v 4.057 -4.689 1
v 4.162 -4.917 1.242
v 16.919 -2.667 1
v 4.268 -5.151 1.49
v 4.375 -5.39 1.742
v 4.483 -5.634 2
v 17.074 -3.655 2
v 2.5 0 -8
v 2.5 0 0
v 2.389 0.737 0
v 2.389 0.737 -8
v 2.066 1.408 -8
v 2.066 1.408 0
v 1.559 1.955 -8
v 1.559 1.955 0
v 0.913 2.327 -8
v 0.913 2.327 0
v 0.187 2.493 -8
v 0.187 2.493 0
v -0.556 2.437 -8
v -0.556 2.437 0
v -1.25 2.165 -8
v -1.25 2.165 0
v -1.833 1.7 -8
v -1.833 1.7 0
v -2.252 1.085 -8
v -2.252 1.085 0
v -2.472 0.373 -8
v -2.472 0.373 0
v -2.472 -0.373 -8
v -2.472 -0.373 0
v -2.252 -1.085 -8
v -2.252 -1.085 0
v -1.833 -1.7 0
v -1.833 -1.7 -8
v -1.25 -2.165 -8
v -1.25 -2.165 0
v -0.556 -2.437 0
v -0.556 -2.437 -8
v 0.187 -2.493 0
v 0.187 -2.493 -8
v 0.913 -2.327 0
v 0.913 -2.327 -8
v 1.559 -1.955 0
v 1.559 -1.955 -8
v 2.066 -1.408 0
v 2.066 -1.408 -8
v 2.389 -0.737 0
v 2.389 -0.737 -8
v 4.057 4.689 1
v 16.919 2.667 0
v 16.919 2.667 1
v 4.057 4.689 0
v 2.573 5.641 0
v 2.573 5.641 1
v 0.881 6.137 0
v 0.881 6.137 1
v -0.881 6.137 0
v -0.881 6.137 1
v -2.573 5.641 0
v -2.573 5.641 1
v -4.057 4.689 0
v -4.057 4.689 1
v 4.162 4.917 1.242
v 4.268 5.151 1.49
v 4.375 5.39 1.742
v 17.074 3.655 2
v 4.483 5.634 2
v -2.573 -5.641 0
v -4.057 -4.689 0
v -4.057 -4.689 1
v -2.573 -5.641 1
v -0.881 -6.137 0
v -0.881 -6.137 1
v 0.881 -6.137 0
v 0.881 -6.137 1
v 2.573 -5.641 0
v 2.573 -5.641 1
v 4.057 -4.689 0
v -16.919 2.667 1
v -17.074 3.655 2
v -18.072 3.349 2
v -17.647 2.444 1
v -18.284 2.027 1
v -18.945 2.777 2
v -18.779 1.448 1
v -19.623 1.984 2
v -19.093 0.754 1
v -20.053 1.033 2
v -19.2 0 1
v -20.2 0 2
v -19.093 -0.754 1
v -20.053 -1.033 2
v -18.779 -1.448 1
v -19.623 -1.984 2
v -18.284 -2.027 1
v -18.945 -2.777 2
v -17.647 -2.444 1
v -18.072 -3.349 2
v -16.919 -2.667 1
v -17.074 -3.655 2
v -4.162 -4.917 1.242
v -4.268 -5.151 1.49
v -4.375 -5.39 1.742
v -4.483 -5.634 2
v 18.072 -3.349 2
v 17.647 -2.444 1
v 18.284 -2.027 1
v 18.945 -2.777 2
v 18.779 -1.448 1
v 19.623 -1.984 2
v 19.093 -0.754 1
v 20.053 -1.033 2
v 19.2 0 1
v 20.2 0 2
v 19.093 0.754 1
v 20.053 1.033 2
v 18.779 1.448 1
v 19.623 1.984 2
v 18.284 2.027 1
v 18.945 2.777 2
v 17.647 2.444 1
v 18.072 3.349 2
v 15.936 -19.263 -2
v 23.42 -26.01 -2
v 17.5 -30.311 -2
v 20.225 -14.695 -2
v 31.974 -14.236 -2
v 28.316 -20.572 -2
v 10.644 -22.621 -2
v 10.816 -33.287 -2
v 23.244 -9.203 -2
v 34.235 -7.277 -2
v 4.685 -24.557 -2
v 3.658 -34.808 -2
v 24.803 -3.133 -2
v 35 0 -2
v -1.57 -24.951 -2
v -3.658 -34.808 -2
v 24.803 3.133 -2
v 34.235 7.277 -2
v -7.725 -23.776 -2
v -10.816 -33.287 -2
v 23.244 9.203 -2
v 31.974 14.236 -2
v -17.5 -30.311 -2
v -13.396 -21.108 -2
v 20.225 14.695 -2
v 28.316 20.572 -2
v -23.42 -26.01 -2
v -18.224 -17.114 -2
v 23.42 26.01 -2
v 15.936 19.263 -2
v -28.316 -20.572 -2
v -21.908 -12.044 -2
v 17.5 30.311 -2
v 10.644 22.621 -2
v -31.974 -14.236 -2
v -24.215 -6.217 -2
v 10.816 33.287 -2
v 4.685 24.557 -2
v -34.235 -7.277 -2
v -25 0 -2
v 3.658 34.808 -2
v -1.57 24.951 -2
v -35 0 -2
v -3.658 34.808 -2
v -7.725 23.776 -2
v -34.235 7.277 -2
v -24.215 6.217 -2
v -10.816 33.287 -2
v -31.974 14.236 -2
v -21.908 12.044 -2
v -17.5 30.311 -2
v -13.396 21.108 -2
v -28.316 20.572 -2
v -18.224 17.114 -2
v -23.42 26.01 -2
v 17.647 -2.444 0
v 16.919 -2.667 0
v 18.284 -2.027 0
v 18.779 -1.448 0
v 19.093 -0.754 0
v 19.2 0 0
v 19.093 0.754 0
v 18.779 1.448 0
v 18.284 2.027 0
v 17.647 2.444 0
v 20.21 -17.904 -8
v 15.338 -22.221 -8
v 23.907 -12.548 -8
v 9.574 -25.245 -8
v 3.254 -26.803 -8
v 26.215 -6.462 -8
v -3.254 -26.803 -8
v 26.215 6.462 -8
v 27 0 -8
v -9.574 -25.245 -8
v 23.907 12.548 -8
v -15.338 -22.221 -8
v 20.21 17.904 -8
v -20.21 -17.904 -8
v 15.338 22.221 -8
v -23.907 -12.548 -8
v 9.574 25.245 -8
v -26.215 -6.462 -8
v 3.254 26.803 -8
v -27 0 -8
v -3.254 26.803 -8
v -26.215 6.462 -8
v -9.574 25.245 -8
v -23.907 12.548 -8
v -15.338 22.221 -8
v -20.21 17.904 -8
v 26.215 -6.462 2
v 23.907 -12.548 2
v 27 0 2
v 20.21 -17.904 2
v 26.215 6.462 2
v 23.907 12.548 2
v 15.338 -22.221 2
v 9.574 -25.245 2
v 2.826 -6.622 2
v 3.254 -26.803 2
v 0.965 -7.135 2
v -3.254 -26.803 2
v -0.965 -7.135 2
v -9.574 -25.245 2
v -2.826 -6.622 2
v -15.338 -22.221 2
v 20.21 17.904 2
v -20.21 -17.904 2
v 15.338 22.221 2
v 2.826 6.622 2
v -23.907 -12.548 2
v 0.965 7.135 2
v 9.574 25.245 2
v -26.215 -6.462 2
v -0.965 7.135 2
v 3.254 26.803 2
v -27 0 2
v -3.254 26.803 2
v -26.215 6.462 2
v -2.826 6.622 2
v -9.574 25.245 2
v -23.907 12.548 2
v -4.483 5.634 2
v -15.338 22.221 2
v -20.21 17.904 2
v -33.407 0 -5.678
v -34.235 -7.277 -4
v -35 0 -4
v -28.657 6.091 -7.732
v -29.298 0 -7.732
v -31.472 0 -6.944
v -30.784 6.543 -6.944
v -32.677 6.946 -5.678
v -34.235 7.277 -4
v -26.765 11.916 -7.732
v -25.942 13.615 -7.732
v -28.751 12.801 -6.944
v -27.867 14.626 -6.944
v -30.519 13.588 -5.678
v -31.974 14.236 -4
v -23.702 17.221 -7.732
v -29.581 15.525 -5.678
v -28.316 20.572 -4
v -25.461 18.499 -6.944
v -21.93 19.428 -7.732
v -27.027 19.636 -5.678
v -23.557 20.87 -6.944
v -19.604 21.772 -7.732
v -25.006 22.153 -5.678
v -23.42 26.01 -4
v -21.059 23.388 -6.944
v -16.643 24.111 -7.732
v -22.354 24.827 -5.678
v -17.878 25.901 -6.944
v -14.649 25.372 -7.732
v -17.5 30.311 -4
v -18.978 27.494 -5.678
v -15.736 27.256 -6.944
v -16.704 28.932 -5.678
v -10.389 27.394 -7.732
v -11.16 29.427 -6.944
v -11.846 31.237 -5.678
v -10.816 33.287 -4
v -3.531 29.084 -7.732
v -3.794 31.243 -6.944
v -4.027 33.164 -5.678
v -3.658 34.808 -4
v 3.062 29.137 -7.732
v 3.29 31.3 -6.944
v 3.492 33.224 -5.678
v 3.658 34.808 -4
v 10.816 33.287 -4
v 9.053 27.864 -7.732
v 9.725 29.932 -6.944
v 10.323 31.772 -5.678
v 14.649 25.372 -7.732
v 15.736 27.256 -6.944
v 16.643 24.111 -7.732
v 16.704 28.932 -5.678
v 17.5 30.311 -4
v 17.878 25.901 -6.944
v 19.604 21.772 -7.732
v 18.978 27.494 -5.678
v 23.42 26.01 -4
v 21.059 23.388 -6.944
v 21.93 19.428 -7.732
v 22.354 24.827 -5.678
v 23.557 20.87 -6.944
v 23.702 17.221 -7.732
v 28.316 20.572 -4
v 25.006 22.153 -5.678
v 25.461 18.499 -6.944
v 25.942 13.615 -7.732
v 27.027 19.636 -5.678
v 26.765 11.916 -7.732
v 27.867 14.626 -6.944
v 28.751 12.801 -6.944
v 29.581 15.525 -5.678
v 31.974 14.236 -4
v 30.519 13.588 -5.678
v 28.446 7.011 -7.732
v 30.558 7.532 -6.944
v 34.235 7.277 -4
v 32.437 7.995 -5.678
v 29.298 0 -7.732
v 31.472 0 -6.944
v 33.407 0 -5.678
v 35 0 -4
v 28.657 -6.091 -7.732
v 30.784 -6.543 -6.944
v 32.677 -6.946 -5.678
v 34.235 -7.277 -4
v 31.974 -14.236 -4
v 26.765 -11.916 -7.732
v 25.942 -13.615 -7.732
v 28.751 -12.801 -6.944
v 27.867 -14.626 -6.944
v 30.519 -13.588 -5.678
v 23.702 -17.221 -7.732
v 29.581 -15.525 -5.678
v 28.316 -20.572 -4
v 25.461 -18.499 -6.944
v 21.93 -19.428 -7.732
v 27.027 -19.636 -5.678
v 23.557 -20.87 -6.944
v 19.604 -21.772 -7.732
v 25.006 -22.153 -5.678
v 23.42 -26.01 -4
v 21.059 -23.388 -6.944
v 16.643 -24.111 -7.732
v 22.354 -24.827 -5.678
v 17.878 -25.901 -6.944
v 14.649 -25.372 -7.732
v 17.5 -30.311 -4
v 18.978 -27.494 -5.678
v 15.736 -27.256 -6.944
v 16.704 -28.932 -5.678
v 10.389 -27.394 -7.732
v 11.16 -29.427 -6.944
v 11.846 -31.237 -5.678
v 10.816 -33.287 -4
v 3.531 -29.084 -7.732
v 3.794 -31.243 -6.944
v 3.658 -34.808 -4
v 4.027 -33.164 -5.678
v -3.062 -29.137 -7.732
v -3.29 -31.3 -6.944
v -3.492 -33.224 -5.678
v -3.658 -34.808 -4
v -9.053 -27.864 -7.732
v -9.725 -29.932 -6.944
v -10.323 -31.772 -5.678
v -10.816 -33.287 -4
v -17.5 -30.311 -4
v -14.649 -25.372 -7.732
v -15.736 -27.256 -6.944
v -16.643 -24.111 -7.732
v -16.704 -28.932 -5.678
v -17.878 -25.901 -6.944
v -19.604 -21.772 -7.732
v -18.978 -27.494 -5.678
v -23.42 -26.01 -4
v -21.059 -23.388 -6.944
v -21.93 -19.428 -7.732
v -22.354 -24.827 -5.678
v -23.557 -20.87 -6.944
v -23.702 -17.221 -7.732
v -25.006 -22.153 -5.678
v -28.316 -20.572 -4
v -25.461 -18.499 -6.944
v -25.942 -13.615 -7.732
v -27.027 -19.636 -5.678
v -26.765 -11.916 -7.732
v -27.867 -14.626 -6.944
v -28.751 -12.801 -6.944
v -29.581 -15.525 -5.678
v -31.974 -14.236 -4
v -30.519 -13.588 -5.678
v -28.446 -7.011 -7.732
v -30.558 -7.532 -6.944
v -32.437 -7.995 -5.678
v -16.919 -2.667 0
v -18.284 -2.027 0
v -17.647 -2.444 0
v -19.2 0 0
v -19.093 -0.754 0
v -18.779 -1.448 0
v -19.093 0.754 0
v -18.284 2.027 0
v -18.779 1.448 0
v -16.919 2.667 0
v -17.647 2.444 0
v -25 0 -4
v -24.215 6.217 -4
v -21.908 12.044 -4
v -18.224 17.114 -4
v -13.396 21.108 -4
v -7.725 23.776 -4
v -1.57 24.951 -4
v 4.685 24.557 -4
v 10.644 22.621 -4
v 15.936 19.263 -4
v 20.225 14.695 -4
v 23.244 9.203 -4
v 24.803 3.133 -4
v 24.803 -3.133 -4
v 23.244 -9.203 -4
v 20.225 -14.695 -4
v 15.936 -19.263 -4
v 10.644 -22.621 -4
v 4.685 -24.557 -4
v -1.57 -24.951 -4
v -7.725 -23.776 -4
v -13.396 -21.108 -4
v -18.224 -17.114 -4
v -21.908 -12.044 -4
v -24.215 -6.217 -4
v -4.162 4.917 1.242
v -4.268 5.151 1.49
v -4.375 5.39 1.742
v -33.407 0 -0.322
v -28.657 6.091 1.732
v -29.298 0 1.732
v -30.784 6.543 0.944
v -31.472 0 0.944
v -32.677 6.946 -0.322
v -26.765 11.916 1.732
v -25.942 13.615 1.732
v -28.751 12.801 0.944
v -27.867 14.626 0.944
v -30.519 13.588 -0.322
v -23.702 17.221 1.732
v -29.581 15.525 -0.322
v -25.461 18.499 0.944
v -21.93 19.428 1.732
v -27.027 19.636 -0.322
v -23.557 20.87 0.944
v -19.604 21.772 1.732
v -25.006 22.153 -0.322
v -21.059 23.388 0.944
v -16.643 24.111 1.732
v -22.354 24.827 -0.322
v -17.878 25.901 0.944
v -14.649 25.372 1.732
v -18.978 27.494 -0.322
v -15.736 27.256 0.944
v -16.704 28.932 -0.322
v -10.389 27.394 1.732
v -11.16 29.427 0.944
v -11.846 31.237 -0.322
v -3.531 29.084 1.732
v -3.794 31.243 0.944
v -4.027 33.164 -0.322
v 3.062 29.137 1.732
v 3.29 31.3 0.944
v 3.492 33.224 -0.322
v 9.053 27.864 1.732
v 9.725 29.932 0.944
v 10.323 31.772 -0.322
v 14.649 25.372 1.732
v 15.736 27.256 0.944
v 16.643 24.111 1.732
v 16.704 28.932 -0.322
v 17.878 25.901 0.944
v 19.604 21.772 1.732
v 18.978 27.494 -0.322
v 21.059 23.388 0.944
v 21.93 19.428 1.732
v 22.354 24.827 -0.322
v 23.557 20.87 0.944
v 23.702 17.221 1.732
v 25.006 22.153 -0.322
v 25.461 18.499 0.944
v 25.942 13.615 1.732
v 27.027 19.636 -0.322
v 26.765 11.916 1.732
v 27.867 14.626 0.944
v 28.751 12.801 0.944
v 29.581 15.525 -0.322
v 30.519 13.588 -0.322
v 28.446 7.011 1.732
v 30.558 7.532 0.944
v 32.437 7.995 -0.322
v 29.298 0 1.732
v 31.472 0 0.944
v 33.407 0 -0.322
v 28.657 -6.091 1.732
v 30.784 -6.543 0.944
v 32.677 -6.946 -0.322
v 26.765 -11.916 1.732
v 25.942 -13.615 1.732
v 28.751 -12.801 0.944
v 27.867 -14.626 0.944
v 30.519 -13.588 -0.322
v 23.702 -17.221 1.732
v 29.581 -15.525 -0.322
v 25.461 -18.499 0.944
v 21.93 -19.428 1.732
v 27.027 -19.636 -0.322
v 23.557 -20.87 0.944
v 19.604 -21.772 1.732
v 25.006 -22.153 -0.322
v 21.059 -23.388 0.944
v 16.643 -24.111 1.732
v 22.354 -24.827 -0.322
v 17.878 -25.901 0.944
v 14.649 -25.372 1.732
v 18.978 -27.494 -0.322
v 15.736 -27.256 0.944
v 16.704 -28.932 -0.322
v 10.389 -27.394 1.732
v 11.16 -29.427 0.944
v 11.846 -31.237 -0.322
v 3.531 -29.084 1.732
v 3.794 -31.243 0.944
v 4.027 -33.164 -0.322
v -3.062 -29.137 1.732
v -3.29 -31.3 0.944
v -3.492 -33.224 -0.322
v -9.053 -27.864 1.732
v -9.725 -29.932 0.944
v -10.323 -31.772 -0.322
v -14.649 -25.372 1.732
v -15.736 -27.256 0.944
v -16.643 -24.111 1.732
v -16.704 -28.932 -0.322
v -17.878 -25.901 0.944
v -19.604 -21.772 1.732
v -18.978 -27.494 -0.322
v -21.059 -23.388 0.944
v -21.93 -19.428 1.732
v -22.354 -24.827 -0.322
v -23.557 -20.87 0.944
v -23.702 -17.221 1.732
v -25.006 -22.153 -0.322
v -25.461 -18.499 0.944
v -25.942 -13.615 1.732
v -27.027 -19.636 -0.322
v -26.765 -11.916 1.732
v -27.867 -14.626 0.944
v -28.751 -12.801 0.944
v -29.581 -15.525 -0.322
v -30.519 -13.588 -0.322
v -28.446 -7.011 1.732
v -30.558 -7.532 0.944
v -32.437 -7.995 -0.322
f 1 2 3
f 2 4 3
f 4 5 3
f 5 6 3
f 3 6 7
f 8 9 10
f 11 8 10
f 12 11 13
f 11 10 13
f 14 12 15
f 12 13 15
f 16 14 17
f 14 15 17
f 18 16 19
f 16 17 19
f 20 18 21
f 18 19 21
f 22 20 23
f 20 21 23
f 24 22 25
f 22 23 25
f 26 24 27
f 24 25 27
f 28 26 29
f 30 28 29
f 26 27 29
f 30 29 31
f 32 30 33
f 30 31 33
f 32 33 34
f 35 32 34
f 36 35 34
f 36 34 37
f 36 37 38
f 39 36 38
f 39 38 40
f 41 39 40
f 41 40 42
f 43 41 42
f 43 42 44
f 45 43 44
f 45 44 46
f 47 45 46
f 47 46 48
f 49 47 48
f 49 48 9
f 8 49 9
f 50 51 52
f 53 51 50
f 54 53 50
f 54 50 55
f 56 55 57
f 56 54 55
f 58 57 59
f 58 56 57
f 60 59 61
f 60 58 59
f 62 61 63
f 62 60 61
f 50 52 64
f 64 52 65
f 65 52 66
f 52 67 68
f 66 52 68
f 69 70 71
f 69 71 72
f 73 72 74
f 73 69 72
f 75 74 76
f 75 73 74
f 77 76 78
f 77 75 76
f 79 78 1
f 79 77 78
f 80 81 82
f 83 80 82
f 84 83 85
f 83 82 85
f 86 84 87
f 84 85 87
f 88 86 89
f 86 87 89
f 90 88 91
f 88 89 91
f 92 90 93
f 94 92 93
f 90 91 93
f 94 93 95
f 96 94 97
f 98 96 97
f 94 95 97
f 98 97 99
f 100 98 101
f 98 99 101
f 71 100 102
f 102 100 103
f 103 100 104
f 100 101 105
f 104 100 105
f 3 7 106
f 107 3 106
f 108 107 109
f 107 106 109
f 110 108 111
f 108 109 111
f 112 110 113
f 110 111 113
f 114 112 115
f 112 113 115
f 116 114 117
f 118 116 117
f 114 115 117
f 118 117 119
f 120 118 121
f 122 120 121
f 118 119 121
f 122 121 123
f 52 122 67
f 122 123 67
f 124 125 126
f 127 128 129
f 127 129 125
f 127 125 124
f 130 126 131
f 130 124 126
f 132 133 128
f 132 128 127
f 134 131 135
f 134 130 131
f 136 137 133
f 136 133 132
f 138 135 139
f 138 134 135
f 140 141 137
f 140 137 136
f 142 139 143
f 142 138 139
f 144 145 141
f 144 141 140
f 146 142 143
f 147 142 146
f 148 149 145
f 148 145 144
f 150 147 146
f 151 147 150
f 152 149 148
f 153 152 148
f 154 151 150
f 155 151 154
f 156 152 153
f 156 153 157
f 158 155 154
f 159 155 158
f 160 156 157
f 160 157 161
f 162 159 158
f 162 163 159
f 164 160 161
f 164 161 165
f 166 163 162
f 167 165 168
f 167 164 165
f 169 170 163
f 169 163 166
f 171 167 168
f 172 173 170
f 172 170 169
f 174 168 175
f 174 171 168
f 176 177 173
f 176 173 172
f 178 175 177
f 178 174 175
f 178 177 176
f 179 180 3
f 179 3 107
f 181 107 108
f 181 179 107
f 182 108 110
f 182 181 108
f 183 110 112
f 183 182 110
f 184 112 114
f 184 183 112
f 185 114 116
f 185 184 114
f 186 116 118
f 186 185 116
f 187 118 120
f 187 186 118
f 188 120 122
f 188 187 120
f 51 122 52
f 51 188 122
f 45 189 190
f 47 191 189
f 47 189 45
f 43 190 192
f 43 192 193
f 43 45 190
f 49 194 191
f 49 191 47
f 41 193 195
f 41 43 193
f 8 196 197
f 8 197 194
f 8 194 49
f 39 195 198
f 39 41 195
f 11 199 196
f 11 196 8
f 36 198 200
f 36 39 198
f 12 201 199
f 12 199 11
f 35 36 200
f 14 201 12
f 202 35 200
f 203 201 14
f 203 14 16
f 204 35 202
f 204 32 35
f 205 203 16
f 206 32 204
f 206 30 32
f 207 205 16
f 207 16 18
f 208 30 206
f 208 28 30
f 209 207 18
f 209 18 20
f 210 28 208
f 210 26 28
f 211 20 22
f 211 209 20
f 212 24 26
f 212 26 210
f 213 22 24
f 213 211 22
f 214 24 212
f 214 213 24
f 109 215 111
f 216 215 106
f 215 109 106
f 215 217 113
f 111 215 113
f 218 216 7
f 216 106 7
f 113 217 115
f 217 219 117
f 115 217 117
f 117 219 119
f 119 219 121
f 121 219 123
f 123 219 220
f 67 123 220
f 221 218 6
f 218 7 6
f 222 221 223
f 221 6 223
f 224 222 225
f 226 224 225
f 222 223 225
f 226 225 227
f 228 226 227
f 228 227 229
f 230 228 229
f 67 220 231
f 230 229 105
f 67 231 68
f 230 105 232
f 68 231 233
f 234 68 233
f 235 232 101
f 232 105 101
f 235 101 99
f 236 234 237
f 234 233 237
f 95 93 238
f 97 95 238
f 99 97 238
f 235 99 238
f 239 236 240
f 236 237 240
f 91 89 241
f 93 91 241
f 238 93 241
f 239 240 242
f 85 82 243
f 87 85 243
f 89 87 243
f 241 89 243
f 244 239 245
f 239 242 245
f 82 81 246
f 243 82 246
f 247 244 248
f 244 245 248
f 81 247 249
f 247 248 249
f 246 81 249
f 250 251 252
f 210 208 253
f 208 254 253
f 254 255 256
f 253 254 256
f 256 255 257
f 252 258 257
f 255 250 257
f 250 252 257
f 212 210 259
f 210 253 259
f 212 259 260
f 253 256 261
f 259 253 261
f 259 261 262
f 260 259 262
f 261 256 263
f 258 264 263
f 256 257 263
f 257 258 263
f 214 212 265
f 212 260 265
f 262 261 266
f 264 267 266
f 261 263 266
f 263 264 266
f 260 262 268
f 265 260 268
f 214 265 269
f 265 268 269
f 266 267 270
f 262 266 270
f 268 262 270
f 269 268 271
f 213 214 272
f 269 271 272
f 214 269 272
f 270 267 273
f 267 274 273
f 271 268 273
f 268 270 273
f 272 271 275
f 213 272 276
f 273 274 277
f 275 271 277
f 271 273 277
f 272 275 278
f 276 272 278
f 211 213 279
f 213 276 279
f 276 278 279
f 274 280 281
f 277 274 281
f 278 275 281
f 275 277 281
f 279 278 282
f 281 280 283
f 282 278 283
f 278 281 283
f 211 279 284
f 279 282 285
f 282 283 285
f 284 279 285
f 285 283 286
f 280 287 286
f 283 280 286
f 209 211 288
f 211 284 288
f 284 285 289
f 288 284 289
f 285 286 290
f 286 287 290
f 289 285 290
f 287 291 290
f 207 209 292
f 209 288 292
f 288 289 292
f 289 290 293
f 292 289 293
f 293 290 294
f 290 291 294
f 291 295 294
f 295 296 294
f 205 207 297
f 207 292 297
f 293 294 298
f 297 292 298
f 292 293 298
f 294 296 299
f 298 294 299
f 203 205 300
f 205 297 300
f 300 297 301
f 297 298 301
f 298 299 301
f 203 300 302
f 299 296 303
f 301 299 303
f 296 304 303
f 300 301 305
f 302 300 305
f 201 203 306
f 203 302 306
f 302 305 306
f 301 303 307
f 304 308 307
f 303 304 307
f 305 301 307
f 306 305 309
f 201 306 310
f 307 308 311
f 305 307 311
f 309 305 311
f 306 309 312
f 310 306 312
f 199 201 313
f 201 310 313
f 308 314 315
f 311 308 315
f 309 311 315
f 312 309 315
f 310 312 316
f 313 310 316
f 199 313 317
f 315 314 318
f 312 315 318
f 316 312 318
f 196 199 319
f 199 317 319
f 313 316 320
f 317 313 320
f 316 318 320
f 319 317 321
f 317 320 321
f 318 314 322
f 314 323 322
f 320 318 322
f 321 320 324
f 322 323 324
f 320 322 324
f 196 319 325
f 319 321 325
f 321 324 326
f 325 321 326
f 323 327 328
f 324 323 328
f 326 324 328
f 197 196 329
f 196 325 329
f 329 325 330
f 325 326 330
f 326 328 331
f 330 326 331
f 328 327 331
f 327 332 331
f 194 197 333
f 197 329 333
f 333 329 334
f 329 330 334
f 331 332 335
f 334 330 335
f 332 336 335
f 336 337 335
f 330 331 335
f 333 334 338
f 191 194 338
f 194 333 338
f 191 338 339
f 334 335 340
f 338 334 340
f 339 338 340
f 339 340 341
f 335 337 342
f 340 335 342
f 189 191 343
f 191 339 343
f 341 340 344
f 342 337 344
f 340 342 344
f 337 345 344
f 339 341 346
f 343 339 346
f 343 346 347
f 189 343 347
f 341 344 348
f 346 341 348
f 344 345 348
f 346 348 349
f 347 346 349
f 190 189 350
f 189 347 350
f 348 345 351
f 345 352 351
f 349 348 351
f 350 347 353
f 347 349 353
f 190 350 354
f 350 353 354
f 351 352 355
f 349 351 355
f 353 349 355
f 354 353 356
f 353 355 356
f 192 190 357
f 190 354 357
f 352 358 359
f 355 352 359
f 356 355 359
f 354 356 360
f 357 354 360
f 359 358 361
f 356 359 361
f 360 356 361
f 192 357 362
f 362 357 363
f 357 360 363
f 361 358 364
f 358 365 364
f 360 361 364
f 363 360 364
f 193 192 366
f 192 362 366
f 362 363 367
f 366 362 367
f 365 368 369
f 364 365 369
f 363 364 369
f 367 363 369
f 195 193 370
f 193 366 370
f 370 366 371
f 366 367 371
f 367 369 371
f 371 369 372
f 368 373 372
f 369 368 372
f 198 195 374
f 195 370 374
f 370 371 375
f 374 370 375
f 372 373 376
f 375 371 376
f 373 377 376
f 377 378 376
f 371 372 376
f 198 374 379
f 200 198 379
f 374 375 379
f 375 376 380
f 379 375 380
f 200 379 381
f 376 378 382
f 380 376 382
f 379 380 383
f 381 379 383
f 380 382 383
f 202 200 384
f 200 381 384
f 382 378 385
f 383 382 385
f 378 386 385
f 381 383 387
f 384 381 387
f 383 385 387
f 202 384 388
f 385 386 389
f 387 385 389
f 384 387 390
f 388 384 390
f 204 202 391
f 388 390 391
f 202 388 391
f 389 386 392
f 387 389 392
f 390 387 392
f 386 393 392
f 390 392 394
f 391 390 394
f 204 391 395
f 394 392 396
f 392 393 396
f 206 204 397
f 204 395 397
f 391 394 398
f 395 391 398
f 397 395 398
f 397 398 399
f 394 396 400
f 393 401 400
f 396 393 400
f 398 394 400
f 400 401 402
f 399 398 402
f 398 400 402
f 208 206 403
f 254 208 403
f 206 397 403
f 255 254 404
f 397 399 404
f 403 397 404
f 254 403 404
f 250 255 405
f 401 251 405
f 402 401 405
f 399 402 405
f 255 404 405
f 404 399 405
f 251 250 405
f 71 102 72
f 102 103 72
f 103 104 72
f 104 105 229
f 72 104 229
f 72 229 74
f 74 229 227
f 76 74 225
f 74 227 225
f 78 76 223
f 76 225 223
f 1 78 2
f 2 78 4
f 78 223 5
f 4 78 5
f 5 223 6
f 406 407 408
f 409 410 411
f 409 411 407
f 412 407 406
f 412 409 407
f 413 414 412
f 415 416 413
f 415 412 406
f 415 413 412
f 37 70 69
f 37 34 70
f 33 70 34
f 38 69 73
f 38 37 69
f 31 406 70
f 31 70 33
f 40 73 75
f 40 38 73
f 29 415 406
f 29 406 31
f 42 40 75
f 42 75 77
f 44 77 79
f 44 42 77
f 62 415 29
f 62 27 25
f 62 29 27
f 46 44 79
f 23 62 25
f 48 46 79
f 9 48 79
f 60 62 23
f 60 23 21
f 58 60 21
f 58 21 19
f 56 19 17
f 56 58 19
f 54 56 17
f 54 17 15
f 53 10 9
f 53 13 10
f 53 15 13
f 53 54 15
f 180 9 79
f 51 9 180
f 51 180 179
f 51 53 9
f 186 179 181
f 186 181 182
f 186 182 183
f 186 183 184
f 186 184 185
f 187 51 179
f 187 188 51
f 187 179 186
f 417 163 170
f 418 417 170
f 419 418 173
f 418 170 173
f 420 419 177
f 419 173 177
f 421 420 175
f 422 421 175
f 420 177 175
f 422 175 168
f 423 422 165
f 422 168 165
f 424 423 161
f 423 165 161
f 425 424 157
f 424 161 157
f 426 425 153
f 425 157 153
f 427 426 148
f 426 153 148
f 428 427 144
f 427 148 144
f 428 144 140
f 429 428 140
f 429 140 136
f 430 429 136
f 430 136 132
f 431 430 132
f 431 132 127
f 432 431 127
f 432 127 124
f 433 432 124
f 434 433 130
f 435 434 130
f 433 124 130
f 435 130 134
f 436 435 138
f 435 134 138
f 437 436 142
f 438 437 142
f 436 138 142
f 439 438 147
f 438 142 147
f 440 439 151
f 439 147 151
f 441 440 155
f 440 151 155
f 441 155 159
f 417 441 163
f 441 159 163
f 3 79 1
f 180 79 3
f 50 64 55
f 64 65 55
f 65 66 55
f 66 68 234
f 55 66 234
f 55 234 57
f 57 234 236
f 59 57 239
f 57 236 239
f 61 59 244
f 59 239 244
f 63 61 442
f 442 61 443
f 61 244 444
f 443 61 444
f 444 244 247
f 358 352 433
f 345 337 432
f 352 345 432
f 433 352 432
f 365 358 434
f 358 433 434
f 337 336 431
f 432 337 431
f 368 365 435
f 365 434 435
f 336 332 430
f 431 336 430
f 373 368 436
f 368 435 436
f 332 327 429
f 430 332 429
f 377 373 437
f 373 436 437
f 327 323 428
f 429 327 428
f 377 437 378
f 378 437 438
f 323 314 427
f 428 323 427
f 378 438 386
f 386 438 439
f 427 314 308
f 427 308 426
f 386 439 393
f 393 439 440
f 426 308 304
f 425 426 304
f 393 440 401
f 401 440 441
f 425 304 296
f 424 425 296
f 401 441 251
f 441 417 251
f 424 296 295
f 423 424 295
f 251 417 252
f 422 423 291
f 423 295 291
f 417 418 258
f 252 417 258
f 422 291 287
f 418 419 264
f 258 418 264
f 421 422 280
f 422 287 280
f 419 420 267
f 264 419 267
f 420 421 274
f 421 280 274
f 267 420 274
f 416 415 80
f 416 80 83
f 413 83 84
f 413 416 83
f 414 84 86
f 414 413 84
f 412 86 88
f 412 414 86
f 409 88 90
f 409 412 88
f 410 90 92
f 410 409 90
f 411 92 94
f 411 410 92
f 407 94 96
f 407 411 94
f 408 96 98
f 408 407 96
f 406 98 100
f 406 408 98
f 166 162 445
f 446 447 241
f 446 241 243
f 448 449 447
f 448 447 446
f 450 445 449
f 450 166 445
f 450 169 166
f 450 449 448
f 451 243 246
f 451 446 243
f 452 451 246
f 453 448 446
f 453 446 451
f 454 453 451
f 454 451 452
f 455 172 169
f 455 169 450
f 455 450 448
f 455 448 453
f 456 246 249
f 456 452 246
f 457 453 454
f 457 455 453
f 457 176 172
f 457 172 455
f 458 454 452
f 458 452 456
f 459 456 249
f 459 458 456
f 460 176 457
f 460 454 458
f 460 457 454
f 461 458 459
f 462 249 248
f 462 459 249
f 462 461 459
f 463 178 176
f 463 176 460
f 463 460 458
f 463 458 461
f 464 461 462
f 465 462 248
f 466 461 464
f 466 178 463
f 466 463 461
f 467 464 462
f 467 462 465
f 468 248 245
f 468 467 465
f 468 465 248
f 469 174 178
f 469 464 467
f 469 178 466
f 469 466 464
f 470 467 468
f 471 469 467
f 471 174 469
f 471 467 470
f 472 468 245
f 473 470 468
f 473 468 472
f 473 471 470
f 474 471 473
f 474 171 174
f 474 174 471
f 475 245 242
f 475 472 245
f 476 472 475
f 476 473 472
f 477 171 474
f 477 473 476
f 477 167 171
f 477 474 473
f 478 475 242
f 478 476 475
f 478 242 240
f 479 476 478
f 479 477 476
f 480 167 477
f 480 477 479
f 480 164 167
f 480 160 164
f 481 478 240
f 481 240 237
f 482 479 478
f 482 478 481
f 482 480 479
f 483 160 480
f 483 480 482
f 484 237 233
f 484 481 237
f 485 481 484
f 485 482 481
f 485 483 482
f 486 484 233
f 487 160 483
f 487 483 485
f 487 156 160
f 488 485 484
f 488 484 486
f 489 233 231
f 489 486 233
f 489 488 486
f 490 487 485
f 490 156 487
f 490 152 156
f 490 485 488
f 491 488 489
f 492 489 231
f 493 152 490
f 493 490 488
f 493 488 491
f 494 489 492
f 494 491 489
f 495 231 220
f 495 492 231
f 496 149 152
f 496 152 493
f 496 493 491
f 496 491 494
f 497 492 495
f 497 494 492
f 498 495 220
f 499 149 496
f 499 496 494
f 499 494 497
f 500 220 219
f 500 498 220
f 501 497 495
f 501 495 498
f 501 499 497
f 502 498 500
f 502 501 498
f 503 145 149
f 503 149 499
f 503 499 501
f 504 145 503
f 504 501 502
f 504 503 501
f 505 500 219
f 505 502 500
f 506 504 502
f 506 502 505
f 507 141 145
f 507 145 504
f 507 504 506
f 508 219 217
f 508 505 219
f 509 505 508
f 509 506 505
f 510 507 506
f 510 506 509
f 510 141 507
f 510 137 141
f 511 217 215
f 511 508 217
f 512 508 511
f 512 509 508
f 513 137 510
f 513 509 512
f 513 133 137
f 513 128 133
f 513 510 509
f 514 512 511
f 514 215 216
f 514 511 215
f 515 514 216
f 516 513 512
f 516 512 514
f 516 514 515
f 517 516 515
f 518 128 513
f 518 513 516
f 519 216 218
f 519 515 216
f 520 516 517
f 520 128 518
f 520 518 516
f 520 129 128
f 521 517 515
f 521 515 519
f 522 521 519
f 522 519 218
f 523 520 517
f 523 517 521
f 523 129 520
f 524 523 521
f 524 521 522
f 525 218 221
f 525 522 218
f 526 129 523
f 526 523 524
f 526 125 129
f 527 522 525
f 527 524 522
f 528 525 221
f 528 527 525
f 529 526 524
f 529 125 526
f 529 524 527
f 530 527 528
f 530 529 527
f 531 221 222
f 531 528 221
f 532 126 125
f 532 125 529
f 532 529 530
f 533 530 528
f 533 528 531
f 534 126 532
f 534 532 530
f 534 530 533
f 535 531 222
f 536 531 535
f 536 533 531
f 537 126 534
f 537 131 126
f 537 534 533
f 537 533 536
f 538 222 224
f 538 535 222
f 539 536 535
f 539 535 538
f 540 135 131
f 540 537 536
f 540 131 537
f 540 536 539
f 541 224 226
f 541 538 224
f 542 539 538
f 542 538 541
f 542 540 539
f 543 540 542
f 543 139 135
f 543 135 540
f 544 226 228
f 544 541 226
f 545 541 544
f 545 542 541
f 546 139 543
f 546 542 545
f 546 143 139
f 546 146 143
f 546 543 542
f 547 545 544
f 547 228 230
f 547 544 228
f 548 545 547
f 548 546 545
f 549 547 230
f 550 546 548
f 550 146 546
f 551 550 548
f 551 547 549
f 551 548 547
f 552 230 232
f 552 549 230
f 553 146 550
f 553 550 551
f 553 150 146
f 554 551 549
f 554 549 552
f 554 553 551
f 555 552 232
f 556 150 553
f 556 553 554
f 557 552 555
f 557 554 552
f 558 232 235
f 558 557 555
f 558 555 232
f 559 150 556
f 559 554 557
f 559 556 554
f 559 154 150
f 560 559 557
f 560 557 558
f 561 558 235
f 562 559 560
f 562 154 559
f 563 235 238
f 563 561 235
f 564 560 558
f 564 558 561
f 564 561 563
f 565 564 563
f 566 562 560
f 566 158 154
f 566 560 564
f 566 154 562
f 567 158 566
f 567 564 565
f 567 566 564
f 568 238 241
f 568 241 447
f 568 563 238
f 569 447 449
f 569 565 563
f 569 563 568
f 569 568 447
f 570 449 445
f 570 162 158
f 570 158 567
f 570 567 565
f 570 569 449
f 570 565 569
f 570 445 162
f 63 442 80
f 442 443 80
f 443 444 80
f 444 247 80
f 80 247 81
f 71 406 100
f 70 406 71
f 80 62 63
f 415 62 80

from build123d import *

# Parameters (mm, degrees)
SKETCH_1_R               = 1.5
EXTRUDE_1_DEPTH          = 2.3
SKETCH_2_R               = 4.4
EXTRUDE_2_DEPTH          = 3.2
SKETCH_3_R               = 4.4
SKETCH_3_R_2             = 3.4
SKETCH_3_R_3             = 2.75
SKETCH_3_R_4             = 1.5
CUT_EXTRUDE_1_DEPTH      = 1
BOSS_EXTRUDE1_DEPTH      = 2
BOSS_EXTRUDE1_DEPTH_BACK = 2
SKETCH1_R                = 35
INTERSECT2_OUTLINE_R     = 4.4
INTERSECT2_OUTLINE_R_2   = 3.4
INTERSECT2_OUTLINE_R_3   = 2.75
INTERSECT2_DEPTH         = 5.5
INTERSECT2_START         = 1
INTERSECT2_2_OUTLINE_R   = 4.4
INTERSECT2_2_OUTLINE_R_2 = 3.4
INTERSECT2_2_OUTLINE_R_3 = 2.75
INTERSECT2_2_OUTLINE_R_4 = 1.5
INTERSECT2_2_DEPTH       = 4.5
FILLET1_R                = 10
SKETCH2_R                = 25
BOSS_EXTRUDE2_DEPTH      = 2
SKETCH3_R                = 27
BOSS_EXTRUDE3_DEPTH      = 2
SKETCH4_R                = 6
CUT_EXTRUDE1_DEPTH       = 2
CUT_EXTRUDE3_REACH       = 52.14
SKETCH5_R                = 2.5
CUT_EXTRUDE4_START       = -2
CUT_EXTRUDE4_DEPTH       = 2
CHAMFER1_SIZE            = 1


# Read off the part's stored shape, not the designer's step: Intersect2
with BuildPart() as part:
    # Эскиз1 → Бобышка-Вытянуть1 (new body)
    with BuildSketch(Plane.XY):
        with BuildLine():
            Line((-3.968626967, 4.5), (-16.888114198, 2.469689731))
            ThreePointArc((-16.888114198, 2.469689731), (-19, 0), (-16.888114198, -2.469689731))
            Line((-16.888114198, -2.469689731), (-3.968626967, -4.5))
            ThreePointArc((-3.968626967, -4.5), (0, -6), (3.968626967, -4.5))
            Line((3.968626967, -4.5), (16.888114198, -2.469689731))
            ThreePointArc((16.888114198, -2.469689731), (19, 0), (16.888114198, 2.469689731))
            Line((16.888114198, 2.469689731), (3.968626967, 4.5))
            ThreePointArc((3.968626967, 4.5), (0, 6), (-3.968626967, 4.5))
        make_face()
        Circle(SKETCH_1_R, mode=Mode.SUBTRACT)
    extrude(amount=EXTRUDE_1_DEPTH)

    # Эскиз2 → Бобышка-Вытянуть2 (add)
    with BuildSketch(Plane.XY.offset(2.3)):
        with Locations(Location((0, 0, 0), (0, 0, 180))):
            Circle(SKETCH_2_R)
        Polygon((0.333439775, 2.639447604), (0, 3.05), (-0.333439775, 2.639447604), (-0.758504156, 2.954178641), (-0.979368078, 2.473601404), (-1.469348706, 2.672735374), (-1.563759083, 2.15232973), (-2.087868673, 2.223354314), (-2.049893354, 1.695819264), (-2.575200173, 1.634271725), (-2.407225286, 1.132754236), (-2.900722375, 0.942501833), (-2.6133024, 0.498514094), (-3.043981522, 0.191511085), (-2.655176114, -0.167049522), (-2.995976115, -0.571513009), (-2.530215347, -0.822116802), (-2.75972251, -1.298626839), (-2.246271844, -1.42552746), (-2.35006539, -1.944143169), (-1.821186821, -1.939366985), (-1.792745019, -2.467501833), (-1.281669931, -2.33134895), (-1.122779886, -2.835818282), (-0.661621006, -2.576843686), (-0.382266362, -3.025949839), (0, -2.660425857), (0.382266362, -3.025949839), (0.661621006, -2.576843686), (1.122779886, -2.835818282), (1.281669931, -2.33134895), (1.792745019, -2.467501833), (1.821186821, -1.939366985), (2.35006539, -1.944143169), (2.246271844, -1.42552746), (2.75972251, -1.298626839), (2.530215347, -0.822116802), (2.995976115, -0.571513009), (2.655176114, -0.167049522), (3.043981522, 0.191511085), (2.6133024, 0.498514094), (2.900722375, 0.942501833), (2.407225286, 1.132754236), (2.575200173, 1.634271725), (2.049893354, 1.695819264), (2.087868673, 2.223354314), (1.563759083, 2.15232973), (1.469348706, 2.672735374), (0.979368078, 2.473601404), (0.758504156, 2.954178641), align=None, mode=Mode.SUBTRACT)
    extrude(amount=EXTRUDE_2_DEPTH)

    # Эскиз3 → Вырез-Вытянуть1 (cut)
    # profile 1 of 2: a face of its own
    with BuildSketch(Plane(origin=(0, 0, 0), x_dir=(-1, 0, 0), z_dir=(0, 0, -1))):
        Circle(SKETCH_3_R)
        Circle(SKETCH_3_R_2, mode=Mode.SUBTRACT)
    # profile 2 of 2: a face of its own
    with BuildSketch(Plane(origin=(0, 0, 0), x_dir=(-1, 0, 0), z_dir=(0, 0, -1))):
        Circle(SKETCH_3_R_3)
        Circle(SKETCH_3_R_4, mode=Mode.SUBTRACT)
    extrude(amount=-CUT_EXTRUDE_1_DEPTH, mode=Mode.SUBTRACT)


with BuildPart() as body_2:
    # Sketch1 → Boss-Extrude1 (new, two sides: drawn at the far end of the back side and taken through both)
    with BuildSketch(Plane(origin=(0, 0, 0), x_dir=(-1, 0, 0), z_dir=(0, 0, -1)).offset(-BOSS_EXTRUDE1_DEPTH_BACK)):
        Circle(SKETCH1_R)
    extrude(amount=BOSS_EXTRUDE1_DEPTH + BOSS_EXTRUDE1_DEPTH_BACK)


with BuildPart() as intersect2_tool:
    # Intersect2 outline → Intersect2 (new body)
    # profile 1 of 2: a face of its own
    with BuildSketch(Plane.XY):
        with BuildLine():
            ThreePointArc((3.968626967, 4.5), (0, 6), (-3.968626967, 4.5))
            Line((-3.968626967, 4.5), (-16.888114198, 2.469689731))
            ThreePointArc((-16.888114198, 2.469689731), (-19, 0), (-16.888114198, -2.469689731))
            Line((-16.888114198, -2.469689731), (-3.968626967, -4.5))
            ThreePointArc((-3.968626967, -4.5), (0, -6), (3.968626967, -4.5))
            Line((3.968626967, -4.5), (16.888114198, -2.469689731))
            ThreePointArc((16.888114198, -2.469689731), (19, 0), (16.888114198, 2.469689731))
            Line((16.888114198, 2.469689731), (3.968626967, 4.5))
        make_face()
        Circle(INTERSECT2_OUTLINE_R, mode=Mode.SUBTRACT)
    # profile 2 of 2: a face of its own
    with BuildSketch(Plane.XY):
        Circle(INTERSECT2_OUTLINE_R_2)
        Circle(INTERSECT2_OUTLINE_R_3, mode=Mode.SUBTRACT)
    extrude(amount=INTERSECT2_DEPTH)


with BuildPart() as part_1:
    add(part.part)

    # Intersect2: cut by intersect2_tool
    add(intersect2_tool.part, mode=Mode.SUBTRACT)


with BuildPart() as body_2_1:
    add(body_2.part)

    # Intersect2: cut by intersect2_tool
    add(intersect2_tool.part, mode=Mode.SUBTRACT)


with BuildPart() as intersect2_2_tool:
    # Intersect2 2 outline → Intersect2 2 (new body)
    # profile 1 of 2: a face of its own
    with BuildSketch(Plane.XY.offset(INTERSECT2_START)):
        Circle(INTERSECT2_2_OUTLINE_R)
        Circle(INTERSECT2_2_OUTLINE_R_2, mode=Mode.SUBTRACT)
    # profile 2 of 2: a face of its own
    with BuildSketch(Plane.XY.offset(INTERSECT2_START)):
        Circle(INTERSECT2_2_OUTLINE_R_3)
        Circle(INTERSECT2_2_OUTLINE_R_4, mode=Mode.SUBTRACT)
    extrude(amount=INTERSECT2_2_DEPTH)


with BuildPart() as part_2:
    add(part_1.part)

    # Intersect2 2: cut by intersect2_2_tool
    add(intersect2_2_tool.part, mode=Mode.SUBTRACT)


with BuildPart() as body_2_2:
    add(body_2_1.part)

    # Intersect2 2: cut by intersect2_2_tool
    add(intersect2_2_tool.part, mode=Mode.SUBTRACT)

    # Fillet1
    # the kernel refuses this fillet: 10 mm, written as the material it takes off along each edge
    with BuildSketch(Plane(origin=(0, 0, 2), x_dir=(-1, 0, 0), z_dir=(0, -1, 0))) as fillet1_piece_1:
        with BuildLine():
            CenterArc((27, 10), FILLET1_R, 270, 53.130102354)
            Line((27, 0), (27, -0.2))
            Line((27, -0.2), (35, -0.2))
            Line((35, -0.2), (35.2, 0))
            ThreePointArc((35.2, 0), (35.2, 2), (35.16, 3.88))
            Line((35.16, 3.88), (35, 4))
        make_face()
    revolve(axis=Axis((0, 0, 2), (0, 0, -1)), mode=Mode.SUBTRACT)


with BuildPart() as body_2_2_1:
    # Mirror9: mirrored copy
    add(body_2_2.part.mirror(Plane.XY.offset(-3)))


with BuildPart() as body_2_3:
    add(body_2_2.part)

    add(body_2_2_1.part)  # Boss-Extrude2 merges body 2 2
    # Sketch2 → Boss-Extrude2 (add)
    with BuildSketch(Plane(origin=(0, 0, -2), x_dir=(-1, 0, 0), z_dir=(0, 0, -1))):
        Circle(SKETCH2_R)
    extrude(amount=BOSS_EXTRUDE2_DEPTH)

    # Sketch3 → Boss-Extrude3 (add)
    with BuildSketch(Plane(origin=(0, 0, -8), x_dir=(-1, 0, 0), z_dir=(0, 0, -1))):
        Circle(SKETCH3_R)
    extrude(amount=-BOSS_EXTRUDE3_DEPTH)

    # Sketch4 → Cut-Extrude1 (cut)
    with BuildSketch(Plane.XY):
        Circle(SKETCH4_R)
    extrude(amount=CUT_EXTRUDE1_DEPTH, mode=Mode.SUBTRACT)

    # Sketch5 → Cut-Extrude3 (cut, up to next)
    with BuildSketch(Plane.XY, mode=Mode.PRIVATE) as cut_extrude3_sk1:
        Circle(SKETCH5_R)
    cut_extrude3_tool1 = extrude(cut_extrude3_sk1.sketch, amount=-CUT_EXTRUDE3_REACH, mode=Mode.PRIVATE) & body_2_3.part
    add(cut_extrude3_tool1.solids().sort_by_distance((0, 0, 0))[0], mode=Mode.SUBTRACT)

    # Sketch6 → Cut-Extrude4 (cut)
    with BuildSketch(Plane.XY.offset(2).offset(CUT_EXTRUDE4_START)):
        with BuildLine():
            Line((16.919163334, 2.66726491), (4.056712891, 4.68861179))
            ThreePointArc((4.056712891, 4.68861179), (0, 6.2), (-4.056712891, 4.68861179))
            Line((-4.056712891, 4.68861179), (-16.919163334, 2.66726491))
            ThreePointArc((-16.919163334, 2.66726491), (-19.2, 0), (-16.919163334, -2.66726491))
            Line((-16.919163334, -2.66726491), (-4.056712891, -4.68861179))
            ThreePointArc((-4.056712891, -4.68861179), (0, -6.2), (4.056712891, -4.68861179))
            Line((4.056712891, -4.68861179), (16.919163334, -2.66726491))
            ThreePointArc((16.919163334, -2.66726491), (19.2, 0), (16.919163334, 2.66726491))
        make_face()
    extrude(amount=CUT_EXTRUDE4_DEPTH, mode=Mode.SUBTRACT)

    # Chamfer1
    chamfer1_edges = [body_2_3.edges().sort_by_distance(p)[0] for p in [
        (0, 6.2, 2),
        (-10.487938112, 3.67793835, 2),
        (-19.2, 0, 2),
        (-10.487938112, -3.67793835, 2),
        (0, -6.2, 2),
        (10.487938112, -3.67793835, 2),
        (19.2, 0, 2),
        (10.487938112, 3.67793835, 2),
    ]]
    chamfer(chamfer1_edges, length=CHAMFER1_SIZE)


solid = body_2_3.part
